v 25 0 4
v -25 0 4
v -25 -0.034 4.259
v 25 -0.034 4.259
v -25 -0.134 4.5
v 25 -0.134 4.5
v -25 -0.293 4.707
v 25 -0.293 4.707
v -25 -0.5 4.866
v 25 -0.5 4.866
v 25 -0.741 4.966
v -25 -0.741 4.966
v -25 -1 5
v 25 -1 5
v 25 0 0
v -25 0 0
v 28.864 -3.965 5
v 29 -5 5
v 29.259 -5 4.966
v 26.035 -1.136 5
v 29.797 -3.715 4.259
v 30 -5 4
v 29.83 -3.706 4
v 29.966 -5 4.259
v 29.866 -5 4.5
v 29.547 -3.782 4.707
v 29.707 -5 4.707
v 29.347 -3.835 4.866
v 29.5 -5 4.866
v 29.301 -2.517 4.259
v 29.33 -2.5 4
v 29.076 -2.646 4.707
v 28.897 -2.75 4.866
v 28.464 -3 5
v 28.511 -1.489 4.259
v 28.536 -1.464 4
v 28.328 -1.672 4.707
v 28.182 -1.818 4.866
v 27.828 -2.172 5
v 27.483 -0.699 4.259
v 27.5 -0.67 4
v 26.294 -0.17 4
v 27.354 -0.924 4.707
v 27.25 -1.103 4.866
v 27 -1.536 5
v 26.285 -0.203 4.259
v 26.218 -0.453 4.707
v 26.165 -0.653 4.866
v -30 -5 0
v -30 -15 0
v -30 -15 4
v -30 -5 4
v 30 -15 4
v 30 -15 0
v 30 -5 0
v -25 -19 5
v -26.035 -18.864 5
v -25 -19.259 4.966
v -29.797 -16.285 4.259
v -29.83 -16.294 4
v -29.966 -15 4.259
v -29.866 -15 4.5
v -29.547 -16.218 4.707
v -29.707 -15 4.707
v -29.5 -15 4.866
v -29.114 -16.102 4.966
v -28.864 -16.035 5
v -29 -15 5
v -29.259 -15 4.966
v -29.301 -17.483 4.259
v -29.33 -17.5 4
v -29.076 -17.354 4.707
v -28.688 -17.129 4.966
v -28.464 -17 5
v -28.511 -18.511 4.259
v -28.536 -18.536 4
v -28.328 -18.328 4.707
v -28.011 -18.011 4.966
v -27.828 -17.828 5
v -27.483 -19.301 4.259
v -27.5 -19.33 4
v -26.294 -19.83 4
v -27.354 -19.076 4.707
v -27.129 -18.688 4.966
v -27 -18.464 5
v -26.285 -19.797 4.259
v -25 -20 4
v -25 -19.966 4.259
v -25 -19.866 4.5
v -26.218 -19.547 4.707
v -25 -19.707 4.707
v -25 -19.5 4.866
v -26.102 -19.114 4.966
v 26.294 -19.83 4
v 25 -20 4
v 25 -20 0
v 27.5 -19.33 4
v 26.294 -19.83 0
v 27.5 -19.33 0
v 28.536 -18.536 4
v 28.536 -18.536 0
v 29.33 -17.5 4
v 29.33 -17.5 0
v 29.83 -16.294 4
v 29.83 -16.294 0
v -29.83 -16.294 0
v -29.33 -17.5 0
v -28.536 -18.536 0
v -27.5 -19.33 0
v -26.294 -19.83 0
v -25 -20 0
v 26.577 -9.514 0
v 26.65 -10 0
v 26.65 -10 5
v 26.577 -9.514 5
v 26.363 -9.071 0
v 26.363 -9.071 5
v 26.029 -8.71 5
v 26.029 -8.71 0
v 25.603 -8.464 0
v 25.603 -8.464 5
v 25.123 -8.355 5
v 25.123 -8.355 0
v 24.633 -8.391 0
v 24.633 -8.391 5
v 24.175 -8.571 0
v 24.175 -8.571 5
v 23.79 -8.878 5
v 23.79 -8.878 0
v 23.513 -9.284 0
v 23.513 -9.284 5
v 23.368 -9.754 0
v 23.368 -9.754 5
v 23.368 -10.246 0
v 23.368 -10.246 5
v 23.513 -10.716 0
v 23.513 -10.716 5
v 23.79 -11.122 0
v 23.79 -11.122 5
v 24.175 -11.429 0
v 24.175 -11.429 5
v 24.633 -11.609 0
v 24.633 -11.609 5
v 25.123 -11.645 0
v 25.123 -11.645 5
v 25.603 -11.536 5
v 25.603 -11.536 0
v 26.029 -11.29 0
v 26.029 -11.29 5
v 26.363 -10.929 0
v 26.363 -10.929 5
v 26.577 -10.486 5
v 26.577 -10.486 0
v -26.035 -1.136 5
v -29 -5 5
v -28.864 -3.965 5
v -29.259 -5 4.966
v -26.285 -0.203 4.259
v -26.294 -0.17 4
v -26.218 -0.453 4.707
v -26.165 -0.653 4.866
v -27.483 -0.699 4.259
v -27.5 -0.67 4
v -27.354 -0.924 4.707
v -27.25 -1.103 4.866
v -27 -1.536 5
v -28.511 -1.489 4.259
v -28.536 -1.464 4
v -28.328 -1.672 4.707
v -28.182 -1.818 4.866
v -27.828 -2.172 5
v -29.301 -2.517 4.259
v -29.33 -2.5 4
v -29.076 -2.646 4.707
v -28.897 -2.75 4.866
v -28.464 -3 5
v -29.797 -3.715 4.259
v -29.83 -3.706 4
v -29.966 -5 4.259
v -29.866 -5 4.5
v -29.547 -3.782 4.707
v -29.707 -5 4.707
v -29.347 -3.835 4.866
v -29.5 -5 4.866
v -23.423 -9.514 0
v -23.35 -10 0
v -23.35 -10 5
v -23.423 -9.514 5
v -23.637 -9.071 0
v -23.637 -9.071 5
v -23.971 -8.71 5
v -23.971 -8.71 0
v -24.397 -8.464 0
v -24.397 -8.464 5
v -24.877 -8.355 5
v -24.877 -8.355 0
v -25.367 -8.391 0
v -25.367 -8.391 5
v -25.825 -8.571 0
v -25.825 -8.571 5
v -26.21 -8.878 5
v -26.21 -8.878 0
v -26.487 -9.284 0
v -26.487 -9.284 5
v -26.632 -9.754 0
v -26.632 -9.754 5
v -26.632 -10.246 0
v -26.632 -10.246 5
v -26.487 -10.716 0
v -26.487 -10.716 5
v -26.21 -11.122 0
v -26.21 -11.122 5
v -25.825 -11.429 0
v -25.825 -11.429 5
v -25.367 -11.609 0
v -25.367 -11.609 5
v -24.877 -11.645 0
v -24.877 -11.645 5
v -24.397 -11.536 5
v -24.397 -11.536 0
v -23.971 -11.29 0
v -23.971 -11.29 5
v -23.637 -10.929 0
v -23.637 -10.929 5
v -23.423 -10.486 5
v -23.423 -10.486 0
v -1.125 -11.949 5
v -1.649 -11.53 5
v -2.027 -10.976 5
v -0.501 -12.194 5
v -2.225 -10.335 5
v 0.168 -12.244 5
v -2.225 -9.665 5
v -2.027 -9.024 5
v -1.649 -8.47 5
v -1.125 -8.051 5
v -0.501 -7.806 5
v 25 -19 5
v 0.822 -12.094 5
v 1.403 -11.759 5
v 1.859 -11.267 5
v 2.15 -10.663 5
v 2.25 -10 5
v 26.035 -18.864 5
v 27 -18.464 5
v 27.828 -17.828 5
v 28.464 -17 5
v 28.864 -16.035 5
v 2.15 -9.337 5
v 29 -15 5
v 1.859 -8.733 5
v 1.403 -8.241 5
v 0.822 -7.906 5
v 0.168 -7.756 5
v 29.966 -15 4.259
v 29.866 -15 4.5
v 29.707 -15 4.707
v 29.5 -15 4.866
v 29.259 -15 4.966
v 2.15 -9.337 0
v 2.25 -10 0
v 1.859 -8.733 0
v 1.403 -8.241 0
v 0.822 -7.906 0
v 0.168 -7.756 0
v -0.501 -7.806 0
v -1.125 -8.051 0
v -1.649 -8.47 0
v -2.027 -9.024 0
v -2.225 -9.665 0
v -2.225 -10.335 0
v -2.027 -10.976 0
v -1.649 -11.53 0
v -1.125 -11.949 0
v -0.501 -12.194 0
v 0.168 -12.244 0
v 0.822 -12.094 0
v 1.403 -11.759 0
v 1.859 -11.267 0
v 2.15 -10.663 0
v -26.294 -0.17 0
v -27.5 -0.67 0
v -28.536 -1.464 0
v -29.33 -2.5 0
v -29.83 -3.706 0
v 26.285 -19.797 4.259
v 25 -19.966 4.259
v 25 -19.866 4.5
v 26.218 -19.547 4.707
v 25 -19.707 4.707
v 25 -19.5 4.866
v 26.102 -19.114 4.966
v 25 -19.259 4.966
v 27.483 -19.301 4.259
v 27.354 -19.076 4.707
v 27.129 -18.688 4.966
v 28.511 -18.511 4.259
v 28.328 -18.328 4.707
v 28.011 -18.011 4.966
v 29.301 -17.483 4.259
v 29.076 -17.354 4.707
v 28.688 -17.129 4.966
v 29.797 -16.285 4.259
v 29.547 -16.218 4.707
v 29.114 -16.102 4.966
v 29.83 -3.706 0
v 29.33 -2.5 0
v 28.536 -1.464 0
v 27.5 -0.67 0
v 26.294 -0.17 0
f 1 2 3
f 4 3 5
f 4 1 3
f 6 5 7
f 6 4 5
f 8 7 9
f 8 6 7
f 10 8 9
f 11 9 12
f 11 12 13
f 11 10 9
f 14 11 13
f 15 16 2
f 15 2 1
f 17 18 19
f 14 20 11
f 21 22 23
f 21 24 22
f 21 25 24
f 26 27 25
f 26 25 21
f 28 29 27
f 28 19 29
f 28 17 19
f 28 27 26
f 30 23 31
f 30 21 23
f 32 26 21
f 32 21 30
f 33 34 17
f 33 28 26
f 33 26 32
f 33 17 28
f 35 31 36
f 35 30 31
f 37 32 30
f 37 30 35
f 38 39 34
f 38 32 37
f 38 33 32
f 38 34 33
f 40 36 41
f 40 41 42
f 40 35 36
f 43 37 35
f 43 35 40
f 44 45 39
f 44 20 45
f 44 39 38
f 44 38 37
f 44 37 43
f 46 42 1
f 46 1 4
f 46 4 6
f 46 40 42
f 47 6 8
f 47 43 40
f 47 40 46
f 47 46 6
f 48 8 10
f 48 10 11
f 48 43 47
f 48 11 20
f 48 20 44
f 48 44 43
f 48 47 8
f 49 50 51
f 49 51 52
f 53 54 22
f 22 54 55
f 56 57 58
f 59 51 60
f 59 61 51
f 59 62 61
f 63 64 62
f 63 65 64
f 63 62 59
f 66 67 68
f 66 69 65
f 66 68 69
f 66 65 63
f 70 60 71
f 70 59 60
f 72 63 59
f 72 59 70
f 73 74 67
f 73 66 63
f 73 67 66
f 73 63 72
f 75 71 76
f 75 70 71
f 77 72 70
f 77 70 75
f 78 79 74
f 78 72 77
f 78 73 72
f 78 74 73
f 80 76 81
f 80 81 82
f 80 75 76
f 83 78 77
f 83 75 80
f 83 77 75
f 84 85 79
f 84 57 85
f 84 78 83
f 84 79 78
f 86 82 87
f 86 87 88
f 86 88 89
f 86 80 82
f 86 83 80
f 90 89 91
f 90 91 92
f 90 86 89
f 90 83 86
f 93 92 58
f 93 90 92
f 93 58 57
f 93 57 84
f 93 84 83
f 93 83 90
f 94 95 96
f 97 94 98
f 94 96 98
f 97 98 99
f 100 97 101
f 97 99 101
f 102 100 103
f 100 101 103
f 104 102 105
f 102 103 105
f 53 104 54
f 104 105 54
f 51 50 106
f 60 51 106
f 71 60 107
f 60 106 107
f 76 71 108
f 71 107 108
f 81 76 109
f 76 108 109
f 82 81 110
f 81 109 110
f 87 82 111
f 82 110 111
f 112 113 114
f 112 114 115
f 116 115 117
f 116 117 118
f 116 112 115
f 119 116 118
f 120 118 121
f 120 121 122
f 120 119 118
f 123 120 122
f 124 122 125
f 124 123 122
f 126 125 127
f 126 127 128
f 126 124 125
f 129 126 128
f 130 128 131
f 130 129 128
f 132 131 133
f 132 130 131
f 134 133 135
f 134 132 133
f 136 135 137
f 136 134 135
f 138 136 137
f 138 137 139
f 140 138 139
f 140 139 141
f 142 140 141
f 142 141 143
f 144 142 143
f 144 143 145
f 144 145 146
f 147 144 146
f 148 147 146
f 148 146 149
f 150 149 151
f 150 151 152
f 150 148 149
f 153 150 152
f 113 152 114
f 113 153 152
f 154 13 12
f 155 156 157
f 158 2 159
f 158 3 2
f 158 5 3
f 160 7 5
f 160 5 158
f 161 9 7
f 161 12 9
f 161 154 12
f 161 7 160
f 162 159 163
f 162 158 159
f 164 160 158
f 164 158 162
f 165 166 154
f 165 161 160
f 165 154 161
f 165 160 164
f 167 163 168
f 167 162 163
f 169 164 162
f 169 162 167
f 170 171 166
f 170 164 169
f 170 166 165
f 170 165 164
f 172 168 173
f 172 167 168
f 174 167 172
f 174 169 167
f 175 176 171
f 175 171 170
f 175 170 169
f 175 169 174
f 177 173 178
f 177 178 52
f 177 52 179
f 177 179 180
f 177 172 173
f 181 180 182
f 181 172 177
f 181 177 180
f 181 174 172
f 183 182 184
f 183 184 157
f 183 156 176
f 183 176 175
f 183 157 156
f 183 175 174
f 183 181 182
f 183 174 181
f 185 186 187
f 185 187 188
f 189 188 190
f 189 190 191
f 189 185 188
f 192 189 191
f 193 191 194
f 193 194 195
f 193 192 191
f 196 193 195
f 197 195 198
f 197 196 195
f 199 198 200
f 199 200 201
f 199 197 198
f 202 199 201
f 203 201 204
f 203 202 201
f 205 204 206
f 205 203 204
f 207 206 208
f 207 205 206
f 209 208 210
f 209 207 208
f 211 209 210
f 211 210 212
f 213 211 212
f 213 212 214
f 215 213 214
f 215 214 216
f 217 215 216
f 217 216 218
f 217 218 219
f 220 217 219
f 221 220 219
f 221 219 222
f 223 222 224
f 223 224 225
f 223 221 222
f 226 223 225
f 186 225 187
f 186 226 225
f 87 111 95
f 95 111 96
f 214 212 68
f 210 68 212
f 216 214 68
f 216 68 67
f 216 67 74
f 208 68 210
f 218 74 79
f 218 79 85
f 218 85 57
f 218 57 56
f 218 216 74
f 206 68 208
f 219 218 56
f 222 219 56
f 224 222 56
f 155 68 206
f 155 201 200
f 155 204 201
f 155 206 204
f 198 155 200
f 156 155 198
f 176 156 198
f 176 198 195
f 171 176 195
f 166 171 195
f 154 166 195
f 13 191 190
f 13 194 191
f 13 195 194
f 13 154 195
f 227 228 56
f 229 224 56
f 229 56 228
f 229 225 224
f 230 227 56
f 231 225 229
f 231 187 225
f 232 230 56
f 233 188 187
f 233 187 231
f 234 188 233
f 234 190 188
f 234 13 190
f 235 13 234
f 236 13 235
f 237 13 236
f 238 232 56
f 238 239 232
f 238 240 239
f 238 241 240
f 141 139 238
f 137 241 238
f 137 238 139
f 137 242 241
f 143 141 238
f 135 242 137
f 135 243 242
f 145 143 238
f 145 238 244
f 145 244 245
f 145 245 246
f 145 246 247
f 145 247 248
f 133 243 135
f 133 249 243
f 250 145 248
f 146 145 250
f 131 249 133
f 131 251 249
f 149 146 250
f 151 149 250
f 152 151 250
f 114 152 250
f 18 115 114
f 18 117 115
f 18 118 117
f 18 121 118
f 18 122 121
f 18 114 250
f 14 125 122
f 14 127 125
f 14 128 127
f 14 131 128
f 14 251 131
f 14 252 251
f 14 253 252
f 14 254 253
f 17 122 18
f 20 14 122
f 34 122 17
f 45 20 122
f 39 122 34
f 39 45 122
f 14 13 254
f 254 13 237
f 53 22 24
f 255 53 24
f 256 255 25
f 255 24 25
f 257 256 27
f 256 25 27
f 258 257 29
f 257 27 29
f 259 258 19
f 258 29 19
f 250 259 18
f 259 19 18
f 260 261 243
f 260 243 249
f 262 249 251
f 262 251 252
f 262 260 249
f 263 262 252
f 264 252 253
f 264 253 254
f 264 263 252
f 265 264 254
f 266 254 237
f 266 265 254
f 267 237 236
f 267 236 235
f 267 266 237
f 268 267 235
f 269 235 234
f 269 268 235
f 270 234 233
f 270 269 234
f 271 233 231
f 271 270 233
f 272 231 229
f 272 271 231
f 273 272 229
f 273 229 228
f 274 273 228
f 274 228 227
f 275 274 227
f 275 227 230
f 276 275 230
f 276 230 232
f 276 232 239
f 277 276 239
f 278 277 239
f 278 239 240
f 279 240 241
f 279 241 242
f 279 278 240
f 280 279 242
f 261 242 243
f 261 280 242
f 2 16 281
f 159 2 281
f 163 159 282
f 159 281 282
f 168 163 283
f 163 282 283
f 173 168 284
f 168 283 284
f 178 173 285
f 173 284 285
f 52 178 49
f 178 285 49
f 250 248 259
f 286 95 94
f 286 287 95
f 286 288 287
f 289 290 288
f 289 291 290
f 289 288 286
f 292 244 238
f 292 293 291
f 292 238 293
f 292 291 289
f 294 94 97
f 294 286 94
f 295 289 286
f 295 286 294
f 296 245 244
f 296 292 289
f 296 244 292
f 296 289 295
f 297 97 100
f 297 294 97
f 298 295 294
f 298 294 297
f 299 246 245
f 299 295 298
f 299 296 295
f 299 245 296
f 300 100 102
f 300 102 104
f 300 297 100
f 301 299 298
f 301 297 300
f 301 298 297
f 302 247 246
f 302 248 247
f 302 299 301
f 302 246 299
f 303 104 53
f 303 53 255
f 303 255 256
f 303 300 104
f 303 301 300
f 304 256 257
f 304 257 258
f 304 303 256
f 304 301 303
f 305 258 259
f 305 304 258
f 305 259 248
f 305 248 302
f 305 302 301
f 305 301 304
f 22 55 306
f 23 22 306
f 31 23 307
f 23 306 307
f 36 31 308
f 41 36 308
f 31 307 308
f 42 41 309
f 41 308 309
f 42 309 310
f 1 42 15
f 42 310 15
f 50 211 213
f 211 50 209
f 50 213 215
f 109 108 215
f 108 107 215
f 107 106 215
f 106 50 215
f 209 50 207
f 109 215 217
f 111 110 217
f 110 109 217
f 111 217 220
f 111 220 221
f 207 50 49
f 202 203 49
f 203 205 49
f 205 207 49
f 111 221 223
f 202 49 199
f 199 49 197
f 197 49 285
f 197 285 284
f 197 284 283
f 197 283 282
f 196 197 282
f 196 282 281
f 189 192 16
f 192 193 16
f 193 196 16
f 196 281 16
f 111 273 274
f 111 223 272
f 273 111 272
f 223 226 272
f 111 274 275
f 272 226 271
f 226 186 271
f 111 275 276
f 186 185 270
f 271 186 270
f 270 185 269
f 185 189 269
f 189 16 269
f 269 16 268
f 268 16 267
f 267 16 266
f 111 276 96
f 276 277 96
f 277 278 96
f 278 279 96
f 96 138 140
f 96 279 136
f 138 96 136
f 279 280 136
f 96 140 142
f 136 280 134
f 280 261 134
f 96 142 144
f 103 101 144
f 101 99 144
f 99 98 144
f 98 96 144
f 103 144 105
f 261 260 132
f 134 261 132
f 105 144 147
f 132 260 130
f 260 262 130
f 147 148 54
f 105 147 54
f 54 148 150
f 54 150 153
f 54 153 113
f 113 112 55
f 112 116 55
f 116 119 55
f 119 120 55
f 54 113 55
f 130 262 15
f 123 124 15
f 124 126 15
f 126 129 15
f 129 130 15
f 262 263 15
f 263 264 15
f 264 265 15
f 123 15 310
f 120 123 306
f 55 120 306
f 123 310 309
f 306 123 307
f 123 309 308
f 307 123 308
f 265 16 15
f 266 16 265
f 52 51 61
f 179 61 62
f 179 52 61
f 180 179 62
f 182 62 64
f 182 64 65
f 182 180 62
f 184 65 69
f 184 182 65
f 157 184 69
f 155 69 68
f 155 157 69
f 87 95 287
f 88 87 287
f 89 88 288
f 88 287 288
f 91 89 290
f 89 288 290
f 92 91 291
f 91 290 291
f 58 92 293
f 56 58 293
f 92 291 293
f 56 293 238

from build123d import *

# Parameters (mm, degrees)
ESQUISSE1_W        = 60
ESQUISSE1_H        = 20
ESQUISSE1_R        = 2.25
ESQUISSE1_R_2      = 1.65
BOSS_EXTRU_1_DEPTH = 5
CONG_1_R           = 1
CONG_3_R           = 5


with BuildPart() as part:
    # Esquisse1 → Boss.-Extru.1 (new body)
    with BuildSketch(Plane.XY):
        with Locations((0, -10)):
            Rectangle(ESQUISSE1_W, ESQUISSE1_H)
        with Locations((0, -10)):
            Circle(ESQUISSE1_R, mode=Mode.SUBTRACT)
        with Locations((25, -10)):
            Circle(ESQUISSE1_R_2, mode=Mode.SUBTRACT)
        with Locations((-25, -10)):
            Circle(ESQUISSE1_R_2, mode=Mode.SUBTRACT)
    extrude(amount=BOSS_EXTRU_1_DEPTH)

    # Congé1
    cong_1_edges = [part.edges().sort_by_distance(p)[0] for p in [
        (-30, -10, 5),
        (0, -20, 5),
        (30, -10, 5),
        (0, 0, 5),
    ]]
    fillet(cong_1_edges, radius=CONG_1_R)

    # Congé3
    # the kernel refuses this fillet: 5 mm, written as the material it takes off along each edge
    with BuildSketch(Plane(origin=(-25, -5, 5), x_dir=(0, 1, 0), z_dir=(1, 0, 0))) as cong_3_piece_1:
        with BuildLine():
            CenterArc((4, -1), 1, 0, 90)
            Line((5, -1), (5, 0))
            Line((5, 0), (4, 0))
        make_face()
    revolve(axis=Axis((-25, -5, 5), (0, 0, 1)), revolution_arc=90, mode=Mode.SUBTRACT)
    with BuildSketch(Plane(origin=(25, -5, 5), x_dir=(1, 0, 0), z_dir=(0, -1, 0))) as cong_3_piece_2:
        with BuildLine():
            CenterArc((4, -1), 1, 0, 90)
            Line((5, -1), (5, 0))
            Line((5, 0), (4, 0))
        make_face()
    revolve(axis=Axis((25, -5, 5), (0, 0, 1)), revolution_arc=90, mode=Mode.SUBTRACT)
    with BuildSketch(Plane(origin=(-25, -15, 5), x_dir=(-1, 0, 0), z_dir=(0, 1, 0))) as cong_3_piece_3:
        with BuildLine():
            CenterArc((4, -1), 1, 0, 90)
            Line((5, -1), (5, 0))
            Line((5, 0), (4, 0))
        make_face()
    revolve(axis=Axis((-25, -15, 5), (0, 0, 1)), revolution_arc=90, mode=Mode.SUBTRACT)
    with BuildSketch(Plane(origin=(25, -15, 5), x_dir=(0, -1, 0), z_dir=(-1, 0, 0))) as cong_3_piece_4:
        with BuildLine():
            CenterArc((4, -1), 1, 0, 90)
            Line((5, -1), (5, 0))
            Line((5, 0), (4, 0))
        make_face()
    revolve(axis=Axis((25, -15, 5), (0, 0, 1)), revolution_arc=90, mode=Mode.SUBTRACT)
    with BuildSketch(Plane(origin=(30, -20, -12.5), x_dir=(0, 1, 0), z_dir=(0, 0, 1)), Plane(origin=(30, 0, -12.5), x_dir=(-1, 0, 0), z_dir=(0, 0, 1))) as cong_3_piece_5:
        with BuildLine():
            CenterArc((CONG_3_R, CONG_3_R), CONG_3_R, 180, 90)
            Line((0, CONG_3_R), (0, 0))
            Line((0, 0), (CONG_3_R, 0))
        make_face()
    extrude(amount=17.5, mode=Mode.SUBTRACT)
    with BuildSketch(Plane(origin=(-30, -20, -12.5), x_dir=(0, 1, 0), z_dir=(0, 0, 1)), Plane(origin=(-30, 0, -12.5), x_dir=(1, 0, 0), z_dir=(0, 0, 1))) as cong_3_piece_6:
        with BuildLine():
            CenterArc((CONG_3_R, -CONG_3_R), CONG_3_R, 90, 90)
            Line((0, -CONG_3_R), (0, 0))
            Line((0, 0), (CONG_3_R, 0))
        make_face()
    extrude(amount=17.5, mode=Mode.SUBTRACT)


solid = part.part
